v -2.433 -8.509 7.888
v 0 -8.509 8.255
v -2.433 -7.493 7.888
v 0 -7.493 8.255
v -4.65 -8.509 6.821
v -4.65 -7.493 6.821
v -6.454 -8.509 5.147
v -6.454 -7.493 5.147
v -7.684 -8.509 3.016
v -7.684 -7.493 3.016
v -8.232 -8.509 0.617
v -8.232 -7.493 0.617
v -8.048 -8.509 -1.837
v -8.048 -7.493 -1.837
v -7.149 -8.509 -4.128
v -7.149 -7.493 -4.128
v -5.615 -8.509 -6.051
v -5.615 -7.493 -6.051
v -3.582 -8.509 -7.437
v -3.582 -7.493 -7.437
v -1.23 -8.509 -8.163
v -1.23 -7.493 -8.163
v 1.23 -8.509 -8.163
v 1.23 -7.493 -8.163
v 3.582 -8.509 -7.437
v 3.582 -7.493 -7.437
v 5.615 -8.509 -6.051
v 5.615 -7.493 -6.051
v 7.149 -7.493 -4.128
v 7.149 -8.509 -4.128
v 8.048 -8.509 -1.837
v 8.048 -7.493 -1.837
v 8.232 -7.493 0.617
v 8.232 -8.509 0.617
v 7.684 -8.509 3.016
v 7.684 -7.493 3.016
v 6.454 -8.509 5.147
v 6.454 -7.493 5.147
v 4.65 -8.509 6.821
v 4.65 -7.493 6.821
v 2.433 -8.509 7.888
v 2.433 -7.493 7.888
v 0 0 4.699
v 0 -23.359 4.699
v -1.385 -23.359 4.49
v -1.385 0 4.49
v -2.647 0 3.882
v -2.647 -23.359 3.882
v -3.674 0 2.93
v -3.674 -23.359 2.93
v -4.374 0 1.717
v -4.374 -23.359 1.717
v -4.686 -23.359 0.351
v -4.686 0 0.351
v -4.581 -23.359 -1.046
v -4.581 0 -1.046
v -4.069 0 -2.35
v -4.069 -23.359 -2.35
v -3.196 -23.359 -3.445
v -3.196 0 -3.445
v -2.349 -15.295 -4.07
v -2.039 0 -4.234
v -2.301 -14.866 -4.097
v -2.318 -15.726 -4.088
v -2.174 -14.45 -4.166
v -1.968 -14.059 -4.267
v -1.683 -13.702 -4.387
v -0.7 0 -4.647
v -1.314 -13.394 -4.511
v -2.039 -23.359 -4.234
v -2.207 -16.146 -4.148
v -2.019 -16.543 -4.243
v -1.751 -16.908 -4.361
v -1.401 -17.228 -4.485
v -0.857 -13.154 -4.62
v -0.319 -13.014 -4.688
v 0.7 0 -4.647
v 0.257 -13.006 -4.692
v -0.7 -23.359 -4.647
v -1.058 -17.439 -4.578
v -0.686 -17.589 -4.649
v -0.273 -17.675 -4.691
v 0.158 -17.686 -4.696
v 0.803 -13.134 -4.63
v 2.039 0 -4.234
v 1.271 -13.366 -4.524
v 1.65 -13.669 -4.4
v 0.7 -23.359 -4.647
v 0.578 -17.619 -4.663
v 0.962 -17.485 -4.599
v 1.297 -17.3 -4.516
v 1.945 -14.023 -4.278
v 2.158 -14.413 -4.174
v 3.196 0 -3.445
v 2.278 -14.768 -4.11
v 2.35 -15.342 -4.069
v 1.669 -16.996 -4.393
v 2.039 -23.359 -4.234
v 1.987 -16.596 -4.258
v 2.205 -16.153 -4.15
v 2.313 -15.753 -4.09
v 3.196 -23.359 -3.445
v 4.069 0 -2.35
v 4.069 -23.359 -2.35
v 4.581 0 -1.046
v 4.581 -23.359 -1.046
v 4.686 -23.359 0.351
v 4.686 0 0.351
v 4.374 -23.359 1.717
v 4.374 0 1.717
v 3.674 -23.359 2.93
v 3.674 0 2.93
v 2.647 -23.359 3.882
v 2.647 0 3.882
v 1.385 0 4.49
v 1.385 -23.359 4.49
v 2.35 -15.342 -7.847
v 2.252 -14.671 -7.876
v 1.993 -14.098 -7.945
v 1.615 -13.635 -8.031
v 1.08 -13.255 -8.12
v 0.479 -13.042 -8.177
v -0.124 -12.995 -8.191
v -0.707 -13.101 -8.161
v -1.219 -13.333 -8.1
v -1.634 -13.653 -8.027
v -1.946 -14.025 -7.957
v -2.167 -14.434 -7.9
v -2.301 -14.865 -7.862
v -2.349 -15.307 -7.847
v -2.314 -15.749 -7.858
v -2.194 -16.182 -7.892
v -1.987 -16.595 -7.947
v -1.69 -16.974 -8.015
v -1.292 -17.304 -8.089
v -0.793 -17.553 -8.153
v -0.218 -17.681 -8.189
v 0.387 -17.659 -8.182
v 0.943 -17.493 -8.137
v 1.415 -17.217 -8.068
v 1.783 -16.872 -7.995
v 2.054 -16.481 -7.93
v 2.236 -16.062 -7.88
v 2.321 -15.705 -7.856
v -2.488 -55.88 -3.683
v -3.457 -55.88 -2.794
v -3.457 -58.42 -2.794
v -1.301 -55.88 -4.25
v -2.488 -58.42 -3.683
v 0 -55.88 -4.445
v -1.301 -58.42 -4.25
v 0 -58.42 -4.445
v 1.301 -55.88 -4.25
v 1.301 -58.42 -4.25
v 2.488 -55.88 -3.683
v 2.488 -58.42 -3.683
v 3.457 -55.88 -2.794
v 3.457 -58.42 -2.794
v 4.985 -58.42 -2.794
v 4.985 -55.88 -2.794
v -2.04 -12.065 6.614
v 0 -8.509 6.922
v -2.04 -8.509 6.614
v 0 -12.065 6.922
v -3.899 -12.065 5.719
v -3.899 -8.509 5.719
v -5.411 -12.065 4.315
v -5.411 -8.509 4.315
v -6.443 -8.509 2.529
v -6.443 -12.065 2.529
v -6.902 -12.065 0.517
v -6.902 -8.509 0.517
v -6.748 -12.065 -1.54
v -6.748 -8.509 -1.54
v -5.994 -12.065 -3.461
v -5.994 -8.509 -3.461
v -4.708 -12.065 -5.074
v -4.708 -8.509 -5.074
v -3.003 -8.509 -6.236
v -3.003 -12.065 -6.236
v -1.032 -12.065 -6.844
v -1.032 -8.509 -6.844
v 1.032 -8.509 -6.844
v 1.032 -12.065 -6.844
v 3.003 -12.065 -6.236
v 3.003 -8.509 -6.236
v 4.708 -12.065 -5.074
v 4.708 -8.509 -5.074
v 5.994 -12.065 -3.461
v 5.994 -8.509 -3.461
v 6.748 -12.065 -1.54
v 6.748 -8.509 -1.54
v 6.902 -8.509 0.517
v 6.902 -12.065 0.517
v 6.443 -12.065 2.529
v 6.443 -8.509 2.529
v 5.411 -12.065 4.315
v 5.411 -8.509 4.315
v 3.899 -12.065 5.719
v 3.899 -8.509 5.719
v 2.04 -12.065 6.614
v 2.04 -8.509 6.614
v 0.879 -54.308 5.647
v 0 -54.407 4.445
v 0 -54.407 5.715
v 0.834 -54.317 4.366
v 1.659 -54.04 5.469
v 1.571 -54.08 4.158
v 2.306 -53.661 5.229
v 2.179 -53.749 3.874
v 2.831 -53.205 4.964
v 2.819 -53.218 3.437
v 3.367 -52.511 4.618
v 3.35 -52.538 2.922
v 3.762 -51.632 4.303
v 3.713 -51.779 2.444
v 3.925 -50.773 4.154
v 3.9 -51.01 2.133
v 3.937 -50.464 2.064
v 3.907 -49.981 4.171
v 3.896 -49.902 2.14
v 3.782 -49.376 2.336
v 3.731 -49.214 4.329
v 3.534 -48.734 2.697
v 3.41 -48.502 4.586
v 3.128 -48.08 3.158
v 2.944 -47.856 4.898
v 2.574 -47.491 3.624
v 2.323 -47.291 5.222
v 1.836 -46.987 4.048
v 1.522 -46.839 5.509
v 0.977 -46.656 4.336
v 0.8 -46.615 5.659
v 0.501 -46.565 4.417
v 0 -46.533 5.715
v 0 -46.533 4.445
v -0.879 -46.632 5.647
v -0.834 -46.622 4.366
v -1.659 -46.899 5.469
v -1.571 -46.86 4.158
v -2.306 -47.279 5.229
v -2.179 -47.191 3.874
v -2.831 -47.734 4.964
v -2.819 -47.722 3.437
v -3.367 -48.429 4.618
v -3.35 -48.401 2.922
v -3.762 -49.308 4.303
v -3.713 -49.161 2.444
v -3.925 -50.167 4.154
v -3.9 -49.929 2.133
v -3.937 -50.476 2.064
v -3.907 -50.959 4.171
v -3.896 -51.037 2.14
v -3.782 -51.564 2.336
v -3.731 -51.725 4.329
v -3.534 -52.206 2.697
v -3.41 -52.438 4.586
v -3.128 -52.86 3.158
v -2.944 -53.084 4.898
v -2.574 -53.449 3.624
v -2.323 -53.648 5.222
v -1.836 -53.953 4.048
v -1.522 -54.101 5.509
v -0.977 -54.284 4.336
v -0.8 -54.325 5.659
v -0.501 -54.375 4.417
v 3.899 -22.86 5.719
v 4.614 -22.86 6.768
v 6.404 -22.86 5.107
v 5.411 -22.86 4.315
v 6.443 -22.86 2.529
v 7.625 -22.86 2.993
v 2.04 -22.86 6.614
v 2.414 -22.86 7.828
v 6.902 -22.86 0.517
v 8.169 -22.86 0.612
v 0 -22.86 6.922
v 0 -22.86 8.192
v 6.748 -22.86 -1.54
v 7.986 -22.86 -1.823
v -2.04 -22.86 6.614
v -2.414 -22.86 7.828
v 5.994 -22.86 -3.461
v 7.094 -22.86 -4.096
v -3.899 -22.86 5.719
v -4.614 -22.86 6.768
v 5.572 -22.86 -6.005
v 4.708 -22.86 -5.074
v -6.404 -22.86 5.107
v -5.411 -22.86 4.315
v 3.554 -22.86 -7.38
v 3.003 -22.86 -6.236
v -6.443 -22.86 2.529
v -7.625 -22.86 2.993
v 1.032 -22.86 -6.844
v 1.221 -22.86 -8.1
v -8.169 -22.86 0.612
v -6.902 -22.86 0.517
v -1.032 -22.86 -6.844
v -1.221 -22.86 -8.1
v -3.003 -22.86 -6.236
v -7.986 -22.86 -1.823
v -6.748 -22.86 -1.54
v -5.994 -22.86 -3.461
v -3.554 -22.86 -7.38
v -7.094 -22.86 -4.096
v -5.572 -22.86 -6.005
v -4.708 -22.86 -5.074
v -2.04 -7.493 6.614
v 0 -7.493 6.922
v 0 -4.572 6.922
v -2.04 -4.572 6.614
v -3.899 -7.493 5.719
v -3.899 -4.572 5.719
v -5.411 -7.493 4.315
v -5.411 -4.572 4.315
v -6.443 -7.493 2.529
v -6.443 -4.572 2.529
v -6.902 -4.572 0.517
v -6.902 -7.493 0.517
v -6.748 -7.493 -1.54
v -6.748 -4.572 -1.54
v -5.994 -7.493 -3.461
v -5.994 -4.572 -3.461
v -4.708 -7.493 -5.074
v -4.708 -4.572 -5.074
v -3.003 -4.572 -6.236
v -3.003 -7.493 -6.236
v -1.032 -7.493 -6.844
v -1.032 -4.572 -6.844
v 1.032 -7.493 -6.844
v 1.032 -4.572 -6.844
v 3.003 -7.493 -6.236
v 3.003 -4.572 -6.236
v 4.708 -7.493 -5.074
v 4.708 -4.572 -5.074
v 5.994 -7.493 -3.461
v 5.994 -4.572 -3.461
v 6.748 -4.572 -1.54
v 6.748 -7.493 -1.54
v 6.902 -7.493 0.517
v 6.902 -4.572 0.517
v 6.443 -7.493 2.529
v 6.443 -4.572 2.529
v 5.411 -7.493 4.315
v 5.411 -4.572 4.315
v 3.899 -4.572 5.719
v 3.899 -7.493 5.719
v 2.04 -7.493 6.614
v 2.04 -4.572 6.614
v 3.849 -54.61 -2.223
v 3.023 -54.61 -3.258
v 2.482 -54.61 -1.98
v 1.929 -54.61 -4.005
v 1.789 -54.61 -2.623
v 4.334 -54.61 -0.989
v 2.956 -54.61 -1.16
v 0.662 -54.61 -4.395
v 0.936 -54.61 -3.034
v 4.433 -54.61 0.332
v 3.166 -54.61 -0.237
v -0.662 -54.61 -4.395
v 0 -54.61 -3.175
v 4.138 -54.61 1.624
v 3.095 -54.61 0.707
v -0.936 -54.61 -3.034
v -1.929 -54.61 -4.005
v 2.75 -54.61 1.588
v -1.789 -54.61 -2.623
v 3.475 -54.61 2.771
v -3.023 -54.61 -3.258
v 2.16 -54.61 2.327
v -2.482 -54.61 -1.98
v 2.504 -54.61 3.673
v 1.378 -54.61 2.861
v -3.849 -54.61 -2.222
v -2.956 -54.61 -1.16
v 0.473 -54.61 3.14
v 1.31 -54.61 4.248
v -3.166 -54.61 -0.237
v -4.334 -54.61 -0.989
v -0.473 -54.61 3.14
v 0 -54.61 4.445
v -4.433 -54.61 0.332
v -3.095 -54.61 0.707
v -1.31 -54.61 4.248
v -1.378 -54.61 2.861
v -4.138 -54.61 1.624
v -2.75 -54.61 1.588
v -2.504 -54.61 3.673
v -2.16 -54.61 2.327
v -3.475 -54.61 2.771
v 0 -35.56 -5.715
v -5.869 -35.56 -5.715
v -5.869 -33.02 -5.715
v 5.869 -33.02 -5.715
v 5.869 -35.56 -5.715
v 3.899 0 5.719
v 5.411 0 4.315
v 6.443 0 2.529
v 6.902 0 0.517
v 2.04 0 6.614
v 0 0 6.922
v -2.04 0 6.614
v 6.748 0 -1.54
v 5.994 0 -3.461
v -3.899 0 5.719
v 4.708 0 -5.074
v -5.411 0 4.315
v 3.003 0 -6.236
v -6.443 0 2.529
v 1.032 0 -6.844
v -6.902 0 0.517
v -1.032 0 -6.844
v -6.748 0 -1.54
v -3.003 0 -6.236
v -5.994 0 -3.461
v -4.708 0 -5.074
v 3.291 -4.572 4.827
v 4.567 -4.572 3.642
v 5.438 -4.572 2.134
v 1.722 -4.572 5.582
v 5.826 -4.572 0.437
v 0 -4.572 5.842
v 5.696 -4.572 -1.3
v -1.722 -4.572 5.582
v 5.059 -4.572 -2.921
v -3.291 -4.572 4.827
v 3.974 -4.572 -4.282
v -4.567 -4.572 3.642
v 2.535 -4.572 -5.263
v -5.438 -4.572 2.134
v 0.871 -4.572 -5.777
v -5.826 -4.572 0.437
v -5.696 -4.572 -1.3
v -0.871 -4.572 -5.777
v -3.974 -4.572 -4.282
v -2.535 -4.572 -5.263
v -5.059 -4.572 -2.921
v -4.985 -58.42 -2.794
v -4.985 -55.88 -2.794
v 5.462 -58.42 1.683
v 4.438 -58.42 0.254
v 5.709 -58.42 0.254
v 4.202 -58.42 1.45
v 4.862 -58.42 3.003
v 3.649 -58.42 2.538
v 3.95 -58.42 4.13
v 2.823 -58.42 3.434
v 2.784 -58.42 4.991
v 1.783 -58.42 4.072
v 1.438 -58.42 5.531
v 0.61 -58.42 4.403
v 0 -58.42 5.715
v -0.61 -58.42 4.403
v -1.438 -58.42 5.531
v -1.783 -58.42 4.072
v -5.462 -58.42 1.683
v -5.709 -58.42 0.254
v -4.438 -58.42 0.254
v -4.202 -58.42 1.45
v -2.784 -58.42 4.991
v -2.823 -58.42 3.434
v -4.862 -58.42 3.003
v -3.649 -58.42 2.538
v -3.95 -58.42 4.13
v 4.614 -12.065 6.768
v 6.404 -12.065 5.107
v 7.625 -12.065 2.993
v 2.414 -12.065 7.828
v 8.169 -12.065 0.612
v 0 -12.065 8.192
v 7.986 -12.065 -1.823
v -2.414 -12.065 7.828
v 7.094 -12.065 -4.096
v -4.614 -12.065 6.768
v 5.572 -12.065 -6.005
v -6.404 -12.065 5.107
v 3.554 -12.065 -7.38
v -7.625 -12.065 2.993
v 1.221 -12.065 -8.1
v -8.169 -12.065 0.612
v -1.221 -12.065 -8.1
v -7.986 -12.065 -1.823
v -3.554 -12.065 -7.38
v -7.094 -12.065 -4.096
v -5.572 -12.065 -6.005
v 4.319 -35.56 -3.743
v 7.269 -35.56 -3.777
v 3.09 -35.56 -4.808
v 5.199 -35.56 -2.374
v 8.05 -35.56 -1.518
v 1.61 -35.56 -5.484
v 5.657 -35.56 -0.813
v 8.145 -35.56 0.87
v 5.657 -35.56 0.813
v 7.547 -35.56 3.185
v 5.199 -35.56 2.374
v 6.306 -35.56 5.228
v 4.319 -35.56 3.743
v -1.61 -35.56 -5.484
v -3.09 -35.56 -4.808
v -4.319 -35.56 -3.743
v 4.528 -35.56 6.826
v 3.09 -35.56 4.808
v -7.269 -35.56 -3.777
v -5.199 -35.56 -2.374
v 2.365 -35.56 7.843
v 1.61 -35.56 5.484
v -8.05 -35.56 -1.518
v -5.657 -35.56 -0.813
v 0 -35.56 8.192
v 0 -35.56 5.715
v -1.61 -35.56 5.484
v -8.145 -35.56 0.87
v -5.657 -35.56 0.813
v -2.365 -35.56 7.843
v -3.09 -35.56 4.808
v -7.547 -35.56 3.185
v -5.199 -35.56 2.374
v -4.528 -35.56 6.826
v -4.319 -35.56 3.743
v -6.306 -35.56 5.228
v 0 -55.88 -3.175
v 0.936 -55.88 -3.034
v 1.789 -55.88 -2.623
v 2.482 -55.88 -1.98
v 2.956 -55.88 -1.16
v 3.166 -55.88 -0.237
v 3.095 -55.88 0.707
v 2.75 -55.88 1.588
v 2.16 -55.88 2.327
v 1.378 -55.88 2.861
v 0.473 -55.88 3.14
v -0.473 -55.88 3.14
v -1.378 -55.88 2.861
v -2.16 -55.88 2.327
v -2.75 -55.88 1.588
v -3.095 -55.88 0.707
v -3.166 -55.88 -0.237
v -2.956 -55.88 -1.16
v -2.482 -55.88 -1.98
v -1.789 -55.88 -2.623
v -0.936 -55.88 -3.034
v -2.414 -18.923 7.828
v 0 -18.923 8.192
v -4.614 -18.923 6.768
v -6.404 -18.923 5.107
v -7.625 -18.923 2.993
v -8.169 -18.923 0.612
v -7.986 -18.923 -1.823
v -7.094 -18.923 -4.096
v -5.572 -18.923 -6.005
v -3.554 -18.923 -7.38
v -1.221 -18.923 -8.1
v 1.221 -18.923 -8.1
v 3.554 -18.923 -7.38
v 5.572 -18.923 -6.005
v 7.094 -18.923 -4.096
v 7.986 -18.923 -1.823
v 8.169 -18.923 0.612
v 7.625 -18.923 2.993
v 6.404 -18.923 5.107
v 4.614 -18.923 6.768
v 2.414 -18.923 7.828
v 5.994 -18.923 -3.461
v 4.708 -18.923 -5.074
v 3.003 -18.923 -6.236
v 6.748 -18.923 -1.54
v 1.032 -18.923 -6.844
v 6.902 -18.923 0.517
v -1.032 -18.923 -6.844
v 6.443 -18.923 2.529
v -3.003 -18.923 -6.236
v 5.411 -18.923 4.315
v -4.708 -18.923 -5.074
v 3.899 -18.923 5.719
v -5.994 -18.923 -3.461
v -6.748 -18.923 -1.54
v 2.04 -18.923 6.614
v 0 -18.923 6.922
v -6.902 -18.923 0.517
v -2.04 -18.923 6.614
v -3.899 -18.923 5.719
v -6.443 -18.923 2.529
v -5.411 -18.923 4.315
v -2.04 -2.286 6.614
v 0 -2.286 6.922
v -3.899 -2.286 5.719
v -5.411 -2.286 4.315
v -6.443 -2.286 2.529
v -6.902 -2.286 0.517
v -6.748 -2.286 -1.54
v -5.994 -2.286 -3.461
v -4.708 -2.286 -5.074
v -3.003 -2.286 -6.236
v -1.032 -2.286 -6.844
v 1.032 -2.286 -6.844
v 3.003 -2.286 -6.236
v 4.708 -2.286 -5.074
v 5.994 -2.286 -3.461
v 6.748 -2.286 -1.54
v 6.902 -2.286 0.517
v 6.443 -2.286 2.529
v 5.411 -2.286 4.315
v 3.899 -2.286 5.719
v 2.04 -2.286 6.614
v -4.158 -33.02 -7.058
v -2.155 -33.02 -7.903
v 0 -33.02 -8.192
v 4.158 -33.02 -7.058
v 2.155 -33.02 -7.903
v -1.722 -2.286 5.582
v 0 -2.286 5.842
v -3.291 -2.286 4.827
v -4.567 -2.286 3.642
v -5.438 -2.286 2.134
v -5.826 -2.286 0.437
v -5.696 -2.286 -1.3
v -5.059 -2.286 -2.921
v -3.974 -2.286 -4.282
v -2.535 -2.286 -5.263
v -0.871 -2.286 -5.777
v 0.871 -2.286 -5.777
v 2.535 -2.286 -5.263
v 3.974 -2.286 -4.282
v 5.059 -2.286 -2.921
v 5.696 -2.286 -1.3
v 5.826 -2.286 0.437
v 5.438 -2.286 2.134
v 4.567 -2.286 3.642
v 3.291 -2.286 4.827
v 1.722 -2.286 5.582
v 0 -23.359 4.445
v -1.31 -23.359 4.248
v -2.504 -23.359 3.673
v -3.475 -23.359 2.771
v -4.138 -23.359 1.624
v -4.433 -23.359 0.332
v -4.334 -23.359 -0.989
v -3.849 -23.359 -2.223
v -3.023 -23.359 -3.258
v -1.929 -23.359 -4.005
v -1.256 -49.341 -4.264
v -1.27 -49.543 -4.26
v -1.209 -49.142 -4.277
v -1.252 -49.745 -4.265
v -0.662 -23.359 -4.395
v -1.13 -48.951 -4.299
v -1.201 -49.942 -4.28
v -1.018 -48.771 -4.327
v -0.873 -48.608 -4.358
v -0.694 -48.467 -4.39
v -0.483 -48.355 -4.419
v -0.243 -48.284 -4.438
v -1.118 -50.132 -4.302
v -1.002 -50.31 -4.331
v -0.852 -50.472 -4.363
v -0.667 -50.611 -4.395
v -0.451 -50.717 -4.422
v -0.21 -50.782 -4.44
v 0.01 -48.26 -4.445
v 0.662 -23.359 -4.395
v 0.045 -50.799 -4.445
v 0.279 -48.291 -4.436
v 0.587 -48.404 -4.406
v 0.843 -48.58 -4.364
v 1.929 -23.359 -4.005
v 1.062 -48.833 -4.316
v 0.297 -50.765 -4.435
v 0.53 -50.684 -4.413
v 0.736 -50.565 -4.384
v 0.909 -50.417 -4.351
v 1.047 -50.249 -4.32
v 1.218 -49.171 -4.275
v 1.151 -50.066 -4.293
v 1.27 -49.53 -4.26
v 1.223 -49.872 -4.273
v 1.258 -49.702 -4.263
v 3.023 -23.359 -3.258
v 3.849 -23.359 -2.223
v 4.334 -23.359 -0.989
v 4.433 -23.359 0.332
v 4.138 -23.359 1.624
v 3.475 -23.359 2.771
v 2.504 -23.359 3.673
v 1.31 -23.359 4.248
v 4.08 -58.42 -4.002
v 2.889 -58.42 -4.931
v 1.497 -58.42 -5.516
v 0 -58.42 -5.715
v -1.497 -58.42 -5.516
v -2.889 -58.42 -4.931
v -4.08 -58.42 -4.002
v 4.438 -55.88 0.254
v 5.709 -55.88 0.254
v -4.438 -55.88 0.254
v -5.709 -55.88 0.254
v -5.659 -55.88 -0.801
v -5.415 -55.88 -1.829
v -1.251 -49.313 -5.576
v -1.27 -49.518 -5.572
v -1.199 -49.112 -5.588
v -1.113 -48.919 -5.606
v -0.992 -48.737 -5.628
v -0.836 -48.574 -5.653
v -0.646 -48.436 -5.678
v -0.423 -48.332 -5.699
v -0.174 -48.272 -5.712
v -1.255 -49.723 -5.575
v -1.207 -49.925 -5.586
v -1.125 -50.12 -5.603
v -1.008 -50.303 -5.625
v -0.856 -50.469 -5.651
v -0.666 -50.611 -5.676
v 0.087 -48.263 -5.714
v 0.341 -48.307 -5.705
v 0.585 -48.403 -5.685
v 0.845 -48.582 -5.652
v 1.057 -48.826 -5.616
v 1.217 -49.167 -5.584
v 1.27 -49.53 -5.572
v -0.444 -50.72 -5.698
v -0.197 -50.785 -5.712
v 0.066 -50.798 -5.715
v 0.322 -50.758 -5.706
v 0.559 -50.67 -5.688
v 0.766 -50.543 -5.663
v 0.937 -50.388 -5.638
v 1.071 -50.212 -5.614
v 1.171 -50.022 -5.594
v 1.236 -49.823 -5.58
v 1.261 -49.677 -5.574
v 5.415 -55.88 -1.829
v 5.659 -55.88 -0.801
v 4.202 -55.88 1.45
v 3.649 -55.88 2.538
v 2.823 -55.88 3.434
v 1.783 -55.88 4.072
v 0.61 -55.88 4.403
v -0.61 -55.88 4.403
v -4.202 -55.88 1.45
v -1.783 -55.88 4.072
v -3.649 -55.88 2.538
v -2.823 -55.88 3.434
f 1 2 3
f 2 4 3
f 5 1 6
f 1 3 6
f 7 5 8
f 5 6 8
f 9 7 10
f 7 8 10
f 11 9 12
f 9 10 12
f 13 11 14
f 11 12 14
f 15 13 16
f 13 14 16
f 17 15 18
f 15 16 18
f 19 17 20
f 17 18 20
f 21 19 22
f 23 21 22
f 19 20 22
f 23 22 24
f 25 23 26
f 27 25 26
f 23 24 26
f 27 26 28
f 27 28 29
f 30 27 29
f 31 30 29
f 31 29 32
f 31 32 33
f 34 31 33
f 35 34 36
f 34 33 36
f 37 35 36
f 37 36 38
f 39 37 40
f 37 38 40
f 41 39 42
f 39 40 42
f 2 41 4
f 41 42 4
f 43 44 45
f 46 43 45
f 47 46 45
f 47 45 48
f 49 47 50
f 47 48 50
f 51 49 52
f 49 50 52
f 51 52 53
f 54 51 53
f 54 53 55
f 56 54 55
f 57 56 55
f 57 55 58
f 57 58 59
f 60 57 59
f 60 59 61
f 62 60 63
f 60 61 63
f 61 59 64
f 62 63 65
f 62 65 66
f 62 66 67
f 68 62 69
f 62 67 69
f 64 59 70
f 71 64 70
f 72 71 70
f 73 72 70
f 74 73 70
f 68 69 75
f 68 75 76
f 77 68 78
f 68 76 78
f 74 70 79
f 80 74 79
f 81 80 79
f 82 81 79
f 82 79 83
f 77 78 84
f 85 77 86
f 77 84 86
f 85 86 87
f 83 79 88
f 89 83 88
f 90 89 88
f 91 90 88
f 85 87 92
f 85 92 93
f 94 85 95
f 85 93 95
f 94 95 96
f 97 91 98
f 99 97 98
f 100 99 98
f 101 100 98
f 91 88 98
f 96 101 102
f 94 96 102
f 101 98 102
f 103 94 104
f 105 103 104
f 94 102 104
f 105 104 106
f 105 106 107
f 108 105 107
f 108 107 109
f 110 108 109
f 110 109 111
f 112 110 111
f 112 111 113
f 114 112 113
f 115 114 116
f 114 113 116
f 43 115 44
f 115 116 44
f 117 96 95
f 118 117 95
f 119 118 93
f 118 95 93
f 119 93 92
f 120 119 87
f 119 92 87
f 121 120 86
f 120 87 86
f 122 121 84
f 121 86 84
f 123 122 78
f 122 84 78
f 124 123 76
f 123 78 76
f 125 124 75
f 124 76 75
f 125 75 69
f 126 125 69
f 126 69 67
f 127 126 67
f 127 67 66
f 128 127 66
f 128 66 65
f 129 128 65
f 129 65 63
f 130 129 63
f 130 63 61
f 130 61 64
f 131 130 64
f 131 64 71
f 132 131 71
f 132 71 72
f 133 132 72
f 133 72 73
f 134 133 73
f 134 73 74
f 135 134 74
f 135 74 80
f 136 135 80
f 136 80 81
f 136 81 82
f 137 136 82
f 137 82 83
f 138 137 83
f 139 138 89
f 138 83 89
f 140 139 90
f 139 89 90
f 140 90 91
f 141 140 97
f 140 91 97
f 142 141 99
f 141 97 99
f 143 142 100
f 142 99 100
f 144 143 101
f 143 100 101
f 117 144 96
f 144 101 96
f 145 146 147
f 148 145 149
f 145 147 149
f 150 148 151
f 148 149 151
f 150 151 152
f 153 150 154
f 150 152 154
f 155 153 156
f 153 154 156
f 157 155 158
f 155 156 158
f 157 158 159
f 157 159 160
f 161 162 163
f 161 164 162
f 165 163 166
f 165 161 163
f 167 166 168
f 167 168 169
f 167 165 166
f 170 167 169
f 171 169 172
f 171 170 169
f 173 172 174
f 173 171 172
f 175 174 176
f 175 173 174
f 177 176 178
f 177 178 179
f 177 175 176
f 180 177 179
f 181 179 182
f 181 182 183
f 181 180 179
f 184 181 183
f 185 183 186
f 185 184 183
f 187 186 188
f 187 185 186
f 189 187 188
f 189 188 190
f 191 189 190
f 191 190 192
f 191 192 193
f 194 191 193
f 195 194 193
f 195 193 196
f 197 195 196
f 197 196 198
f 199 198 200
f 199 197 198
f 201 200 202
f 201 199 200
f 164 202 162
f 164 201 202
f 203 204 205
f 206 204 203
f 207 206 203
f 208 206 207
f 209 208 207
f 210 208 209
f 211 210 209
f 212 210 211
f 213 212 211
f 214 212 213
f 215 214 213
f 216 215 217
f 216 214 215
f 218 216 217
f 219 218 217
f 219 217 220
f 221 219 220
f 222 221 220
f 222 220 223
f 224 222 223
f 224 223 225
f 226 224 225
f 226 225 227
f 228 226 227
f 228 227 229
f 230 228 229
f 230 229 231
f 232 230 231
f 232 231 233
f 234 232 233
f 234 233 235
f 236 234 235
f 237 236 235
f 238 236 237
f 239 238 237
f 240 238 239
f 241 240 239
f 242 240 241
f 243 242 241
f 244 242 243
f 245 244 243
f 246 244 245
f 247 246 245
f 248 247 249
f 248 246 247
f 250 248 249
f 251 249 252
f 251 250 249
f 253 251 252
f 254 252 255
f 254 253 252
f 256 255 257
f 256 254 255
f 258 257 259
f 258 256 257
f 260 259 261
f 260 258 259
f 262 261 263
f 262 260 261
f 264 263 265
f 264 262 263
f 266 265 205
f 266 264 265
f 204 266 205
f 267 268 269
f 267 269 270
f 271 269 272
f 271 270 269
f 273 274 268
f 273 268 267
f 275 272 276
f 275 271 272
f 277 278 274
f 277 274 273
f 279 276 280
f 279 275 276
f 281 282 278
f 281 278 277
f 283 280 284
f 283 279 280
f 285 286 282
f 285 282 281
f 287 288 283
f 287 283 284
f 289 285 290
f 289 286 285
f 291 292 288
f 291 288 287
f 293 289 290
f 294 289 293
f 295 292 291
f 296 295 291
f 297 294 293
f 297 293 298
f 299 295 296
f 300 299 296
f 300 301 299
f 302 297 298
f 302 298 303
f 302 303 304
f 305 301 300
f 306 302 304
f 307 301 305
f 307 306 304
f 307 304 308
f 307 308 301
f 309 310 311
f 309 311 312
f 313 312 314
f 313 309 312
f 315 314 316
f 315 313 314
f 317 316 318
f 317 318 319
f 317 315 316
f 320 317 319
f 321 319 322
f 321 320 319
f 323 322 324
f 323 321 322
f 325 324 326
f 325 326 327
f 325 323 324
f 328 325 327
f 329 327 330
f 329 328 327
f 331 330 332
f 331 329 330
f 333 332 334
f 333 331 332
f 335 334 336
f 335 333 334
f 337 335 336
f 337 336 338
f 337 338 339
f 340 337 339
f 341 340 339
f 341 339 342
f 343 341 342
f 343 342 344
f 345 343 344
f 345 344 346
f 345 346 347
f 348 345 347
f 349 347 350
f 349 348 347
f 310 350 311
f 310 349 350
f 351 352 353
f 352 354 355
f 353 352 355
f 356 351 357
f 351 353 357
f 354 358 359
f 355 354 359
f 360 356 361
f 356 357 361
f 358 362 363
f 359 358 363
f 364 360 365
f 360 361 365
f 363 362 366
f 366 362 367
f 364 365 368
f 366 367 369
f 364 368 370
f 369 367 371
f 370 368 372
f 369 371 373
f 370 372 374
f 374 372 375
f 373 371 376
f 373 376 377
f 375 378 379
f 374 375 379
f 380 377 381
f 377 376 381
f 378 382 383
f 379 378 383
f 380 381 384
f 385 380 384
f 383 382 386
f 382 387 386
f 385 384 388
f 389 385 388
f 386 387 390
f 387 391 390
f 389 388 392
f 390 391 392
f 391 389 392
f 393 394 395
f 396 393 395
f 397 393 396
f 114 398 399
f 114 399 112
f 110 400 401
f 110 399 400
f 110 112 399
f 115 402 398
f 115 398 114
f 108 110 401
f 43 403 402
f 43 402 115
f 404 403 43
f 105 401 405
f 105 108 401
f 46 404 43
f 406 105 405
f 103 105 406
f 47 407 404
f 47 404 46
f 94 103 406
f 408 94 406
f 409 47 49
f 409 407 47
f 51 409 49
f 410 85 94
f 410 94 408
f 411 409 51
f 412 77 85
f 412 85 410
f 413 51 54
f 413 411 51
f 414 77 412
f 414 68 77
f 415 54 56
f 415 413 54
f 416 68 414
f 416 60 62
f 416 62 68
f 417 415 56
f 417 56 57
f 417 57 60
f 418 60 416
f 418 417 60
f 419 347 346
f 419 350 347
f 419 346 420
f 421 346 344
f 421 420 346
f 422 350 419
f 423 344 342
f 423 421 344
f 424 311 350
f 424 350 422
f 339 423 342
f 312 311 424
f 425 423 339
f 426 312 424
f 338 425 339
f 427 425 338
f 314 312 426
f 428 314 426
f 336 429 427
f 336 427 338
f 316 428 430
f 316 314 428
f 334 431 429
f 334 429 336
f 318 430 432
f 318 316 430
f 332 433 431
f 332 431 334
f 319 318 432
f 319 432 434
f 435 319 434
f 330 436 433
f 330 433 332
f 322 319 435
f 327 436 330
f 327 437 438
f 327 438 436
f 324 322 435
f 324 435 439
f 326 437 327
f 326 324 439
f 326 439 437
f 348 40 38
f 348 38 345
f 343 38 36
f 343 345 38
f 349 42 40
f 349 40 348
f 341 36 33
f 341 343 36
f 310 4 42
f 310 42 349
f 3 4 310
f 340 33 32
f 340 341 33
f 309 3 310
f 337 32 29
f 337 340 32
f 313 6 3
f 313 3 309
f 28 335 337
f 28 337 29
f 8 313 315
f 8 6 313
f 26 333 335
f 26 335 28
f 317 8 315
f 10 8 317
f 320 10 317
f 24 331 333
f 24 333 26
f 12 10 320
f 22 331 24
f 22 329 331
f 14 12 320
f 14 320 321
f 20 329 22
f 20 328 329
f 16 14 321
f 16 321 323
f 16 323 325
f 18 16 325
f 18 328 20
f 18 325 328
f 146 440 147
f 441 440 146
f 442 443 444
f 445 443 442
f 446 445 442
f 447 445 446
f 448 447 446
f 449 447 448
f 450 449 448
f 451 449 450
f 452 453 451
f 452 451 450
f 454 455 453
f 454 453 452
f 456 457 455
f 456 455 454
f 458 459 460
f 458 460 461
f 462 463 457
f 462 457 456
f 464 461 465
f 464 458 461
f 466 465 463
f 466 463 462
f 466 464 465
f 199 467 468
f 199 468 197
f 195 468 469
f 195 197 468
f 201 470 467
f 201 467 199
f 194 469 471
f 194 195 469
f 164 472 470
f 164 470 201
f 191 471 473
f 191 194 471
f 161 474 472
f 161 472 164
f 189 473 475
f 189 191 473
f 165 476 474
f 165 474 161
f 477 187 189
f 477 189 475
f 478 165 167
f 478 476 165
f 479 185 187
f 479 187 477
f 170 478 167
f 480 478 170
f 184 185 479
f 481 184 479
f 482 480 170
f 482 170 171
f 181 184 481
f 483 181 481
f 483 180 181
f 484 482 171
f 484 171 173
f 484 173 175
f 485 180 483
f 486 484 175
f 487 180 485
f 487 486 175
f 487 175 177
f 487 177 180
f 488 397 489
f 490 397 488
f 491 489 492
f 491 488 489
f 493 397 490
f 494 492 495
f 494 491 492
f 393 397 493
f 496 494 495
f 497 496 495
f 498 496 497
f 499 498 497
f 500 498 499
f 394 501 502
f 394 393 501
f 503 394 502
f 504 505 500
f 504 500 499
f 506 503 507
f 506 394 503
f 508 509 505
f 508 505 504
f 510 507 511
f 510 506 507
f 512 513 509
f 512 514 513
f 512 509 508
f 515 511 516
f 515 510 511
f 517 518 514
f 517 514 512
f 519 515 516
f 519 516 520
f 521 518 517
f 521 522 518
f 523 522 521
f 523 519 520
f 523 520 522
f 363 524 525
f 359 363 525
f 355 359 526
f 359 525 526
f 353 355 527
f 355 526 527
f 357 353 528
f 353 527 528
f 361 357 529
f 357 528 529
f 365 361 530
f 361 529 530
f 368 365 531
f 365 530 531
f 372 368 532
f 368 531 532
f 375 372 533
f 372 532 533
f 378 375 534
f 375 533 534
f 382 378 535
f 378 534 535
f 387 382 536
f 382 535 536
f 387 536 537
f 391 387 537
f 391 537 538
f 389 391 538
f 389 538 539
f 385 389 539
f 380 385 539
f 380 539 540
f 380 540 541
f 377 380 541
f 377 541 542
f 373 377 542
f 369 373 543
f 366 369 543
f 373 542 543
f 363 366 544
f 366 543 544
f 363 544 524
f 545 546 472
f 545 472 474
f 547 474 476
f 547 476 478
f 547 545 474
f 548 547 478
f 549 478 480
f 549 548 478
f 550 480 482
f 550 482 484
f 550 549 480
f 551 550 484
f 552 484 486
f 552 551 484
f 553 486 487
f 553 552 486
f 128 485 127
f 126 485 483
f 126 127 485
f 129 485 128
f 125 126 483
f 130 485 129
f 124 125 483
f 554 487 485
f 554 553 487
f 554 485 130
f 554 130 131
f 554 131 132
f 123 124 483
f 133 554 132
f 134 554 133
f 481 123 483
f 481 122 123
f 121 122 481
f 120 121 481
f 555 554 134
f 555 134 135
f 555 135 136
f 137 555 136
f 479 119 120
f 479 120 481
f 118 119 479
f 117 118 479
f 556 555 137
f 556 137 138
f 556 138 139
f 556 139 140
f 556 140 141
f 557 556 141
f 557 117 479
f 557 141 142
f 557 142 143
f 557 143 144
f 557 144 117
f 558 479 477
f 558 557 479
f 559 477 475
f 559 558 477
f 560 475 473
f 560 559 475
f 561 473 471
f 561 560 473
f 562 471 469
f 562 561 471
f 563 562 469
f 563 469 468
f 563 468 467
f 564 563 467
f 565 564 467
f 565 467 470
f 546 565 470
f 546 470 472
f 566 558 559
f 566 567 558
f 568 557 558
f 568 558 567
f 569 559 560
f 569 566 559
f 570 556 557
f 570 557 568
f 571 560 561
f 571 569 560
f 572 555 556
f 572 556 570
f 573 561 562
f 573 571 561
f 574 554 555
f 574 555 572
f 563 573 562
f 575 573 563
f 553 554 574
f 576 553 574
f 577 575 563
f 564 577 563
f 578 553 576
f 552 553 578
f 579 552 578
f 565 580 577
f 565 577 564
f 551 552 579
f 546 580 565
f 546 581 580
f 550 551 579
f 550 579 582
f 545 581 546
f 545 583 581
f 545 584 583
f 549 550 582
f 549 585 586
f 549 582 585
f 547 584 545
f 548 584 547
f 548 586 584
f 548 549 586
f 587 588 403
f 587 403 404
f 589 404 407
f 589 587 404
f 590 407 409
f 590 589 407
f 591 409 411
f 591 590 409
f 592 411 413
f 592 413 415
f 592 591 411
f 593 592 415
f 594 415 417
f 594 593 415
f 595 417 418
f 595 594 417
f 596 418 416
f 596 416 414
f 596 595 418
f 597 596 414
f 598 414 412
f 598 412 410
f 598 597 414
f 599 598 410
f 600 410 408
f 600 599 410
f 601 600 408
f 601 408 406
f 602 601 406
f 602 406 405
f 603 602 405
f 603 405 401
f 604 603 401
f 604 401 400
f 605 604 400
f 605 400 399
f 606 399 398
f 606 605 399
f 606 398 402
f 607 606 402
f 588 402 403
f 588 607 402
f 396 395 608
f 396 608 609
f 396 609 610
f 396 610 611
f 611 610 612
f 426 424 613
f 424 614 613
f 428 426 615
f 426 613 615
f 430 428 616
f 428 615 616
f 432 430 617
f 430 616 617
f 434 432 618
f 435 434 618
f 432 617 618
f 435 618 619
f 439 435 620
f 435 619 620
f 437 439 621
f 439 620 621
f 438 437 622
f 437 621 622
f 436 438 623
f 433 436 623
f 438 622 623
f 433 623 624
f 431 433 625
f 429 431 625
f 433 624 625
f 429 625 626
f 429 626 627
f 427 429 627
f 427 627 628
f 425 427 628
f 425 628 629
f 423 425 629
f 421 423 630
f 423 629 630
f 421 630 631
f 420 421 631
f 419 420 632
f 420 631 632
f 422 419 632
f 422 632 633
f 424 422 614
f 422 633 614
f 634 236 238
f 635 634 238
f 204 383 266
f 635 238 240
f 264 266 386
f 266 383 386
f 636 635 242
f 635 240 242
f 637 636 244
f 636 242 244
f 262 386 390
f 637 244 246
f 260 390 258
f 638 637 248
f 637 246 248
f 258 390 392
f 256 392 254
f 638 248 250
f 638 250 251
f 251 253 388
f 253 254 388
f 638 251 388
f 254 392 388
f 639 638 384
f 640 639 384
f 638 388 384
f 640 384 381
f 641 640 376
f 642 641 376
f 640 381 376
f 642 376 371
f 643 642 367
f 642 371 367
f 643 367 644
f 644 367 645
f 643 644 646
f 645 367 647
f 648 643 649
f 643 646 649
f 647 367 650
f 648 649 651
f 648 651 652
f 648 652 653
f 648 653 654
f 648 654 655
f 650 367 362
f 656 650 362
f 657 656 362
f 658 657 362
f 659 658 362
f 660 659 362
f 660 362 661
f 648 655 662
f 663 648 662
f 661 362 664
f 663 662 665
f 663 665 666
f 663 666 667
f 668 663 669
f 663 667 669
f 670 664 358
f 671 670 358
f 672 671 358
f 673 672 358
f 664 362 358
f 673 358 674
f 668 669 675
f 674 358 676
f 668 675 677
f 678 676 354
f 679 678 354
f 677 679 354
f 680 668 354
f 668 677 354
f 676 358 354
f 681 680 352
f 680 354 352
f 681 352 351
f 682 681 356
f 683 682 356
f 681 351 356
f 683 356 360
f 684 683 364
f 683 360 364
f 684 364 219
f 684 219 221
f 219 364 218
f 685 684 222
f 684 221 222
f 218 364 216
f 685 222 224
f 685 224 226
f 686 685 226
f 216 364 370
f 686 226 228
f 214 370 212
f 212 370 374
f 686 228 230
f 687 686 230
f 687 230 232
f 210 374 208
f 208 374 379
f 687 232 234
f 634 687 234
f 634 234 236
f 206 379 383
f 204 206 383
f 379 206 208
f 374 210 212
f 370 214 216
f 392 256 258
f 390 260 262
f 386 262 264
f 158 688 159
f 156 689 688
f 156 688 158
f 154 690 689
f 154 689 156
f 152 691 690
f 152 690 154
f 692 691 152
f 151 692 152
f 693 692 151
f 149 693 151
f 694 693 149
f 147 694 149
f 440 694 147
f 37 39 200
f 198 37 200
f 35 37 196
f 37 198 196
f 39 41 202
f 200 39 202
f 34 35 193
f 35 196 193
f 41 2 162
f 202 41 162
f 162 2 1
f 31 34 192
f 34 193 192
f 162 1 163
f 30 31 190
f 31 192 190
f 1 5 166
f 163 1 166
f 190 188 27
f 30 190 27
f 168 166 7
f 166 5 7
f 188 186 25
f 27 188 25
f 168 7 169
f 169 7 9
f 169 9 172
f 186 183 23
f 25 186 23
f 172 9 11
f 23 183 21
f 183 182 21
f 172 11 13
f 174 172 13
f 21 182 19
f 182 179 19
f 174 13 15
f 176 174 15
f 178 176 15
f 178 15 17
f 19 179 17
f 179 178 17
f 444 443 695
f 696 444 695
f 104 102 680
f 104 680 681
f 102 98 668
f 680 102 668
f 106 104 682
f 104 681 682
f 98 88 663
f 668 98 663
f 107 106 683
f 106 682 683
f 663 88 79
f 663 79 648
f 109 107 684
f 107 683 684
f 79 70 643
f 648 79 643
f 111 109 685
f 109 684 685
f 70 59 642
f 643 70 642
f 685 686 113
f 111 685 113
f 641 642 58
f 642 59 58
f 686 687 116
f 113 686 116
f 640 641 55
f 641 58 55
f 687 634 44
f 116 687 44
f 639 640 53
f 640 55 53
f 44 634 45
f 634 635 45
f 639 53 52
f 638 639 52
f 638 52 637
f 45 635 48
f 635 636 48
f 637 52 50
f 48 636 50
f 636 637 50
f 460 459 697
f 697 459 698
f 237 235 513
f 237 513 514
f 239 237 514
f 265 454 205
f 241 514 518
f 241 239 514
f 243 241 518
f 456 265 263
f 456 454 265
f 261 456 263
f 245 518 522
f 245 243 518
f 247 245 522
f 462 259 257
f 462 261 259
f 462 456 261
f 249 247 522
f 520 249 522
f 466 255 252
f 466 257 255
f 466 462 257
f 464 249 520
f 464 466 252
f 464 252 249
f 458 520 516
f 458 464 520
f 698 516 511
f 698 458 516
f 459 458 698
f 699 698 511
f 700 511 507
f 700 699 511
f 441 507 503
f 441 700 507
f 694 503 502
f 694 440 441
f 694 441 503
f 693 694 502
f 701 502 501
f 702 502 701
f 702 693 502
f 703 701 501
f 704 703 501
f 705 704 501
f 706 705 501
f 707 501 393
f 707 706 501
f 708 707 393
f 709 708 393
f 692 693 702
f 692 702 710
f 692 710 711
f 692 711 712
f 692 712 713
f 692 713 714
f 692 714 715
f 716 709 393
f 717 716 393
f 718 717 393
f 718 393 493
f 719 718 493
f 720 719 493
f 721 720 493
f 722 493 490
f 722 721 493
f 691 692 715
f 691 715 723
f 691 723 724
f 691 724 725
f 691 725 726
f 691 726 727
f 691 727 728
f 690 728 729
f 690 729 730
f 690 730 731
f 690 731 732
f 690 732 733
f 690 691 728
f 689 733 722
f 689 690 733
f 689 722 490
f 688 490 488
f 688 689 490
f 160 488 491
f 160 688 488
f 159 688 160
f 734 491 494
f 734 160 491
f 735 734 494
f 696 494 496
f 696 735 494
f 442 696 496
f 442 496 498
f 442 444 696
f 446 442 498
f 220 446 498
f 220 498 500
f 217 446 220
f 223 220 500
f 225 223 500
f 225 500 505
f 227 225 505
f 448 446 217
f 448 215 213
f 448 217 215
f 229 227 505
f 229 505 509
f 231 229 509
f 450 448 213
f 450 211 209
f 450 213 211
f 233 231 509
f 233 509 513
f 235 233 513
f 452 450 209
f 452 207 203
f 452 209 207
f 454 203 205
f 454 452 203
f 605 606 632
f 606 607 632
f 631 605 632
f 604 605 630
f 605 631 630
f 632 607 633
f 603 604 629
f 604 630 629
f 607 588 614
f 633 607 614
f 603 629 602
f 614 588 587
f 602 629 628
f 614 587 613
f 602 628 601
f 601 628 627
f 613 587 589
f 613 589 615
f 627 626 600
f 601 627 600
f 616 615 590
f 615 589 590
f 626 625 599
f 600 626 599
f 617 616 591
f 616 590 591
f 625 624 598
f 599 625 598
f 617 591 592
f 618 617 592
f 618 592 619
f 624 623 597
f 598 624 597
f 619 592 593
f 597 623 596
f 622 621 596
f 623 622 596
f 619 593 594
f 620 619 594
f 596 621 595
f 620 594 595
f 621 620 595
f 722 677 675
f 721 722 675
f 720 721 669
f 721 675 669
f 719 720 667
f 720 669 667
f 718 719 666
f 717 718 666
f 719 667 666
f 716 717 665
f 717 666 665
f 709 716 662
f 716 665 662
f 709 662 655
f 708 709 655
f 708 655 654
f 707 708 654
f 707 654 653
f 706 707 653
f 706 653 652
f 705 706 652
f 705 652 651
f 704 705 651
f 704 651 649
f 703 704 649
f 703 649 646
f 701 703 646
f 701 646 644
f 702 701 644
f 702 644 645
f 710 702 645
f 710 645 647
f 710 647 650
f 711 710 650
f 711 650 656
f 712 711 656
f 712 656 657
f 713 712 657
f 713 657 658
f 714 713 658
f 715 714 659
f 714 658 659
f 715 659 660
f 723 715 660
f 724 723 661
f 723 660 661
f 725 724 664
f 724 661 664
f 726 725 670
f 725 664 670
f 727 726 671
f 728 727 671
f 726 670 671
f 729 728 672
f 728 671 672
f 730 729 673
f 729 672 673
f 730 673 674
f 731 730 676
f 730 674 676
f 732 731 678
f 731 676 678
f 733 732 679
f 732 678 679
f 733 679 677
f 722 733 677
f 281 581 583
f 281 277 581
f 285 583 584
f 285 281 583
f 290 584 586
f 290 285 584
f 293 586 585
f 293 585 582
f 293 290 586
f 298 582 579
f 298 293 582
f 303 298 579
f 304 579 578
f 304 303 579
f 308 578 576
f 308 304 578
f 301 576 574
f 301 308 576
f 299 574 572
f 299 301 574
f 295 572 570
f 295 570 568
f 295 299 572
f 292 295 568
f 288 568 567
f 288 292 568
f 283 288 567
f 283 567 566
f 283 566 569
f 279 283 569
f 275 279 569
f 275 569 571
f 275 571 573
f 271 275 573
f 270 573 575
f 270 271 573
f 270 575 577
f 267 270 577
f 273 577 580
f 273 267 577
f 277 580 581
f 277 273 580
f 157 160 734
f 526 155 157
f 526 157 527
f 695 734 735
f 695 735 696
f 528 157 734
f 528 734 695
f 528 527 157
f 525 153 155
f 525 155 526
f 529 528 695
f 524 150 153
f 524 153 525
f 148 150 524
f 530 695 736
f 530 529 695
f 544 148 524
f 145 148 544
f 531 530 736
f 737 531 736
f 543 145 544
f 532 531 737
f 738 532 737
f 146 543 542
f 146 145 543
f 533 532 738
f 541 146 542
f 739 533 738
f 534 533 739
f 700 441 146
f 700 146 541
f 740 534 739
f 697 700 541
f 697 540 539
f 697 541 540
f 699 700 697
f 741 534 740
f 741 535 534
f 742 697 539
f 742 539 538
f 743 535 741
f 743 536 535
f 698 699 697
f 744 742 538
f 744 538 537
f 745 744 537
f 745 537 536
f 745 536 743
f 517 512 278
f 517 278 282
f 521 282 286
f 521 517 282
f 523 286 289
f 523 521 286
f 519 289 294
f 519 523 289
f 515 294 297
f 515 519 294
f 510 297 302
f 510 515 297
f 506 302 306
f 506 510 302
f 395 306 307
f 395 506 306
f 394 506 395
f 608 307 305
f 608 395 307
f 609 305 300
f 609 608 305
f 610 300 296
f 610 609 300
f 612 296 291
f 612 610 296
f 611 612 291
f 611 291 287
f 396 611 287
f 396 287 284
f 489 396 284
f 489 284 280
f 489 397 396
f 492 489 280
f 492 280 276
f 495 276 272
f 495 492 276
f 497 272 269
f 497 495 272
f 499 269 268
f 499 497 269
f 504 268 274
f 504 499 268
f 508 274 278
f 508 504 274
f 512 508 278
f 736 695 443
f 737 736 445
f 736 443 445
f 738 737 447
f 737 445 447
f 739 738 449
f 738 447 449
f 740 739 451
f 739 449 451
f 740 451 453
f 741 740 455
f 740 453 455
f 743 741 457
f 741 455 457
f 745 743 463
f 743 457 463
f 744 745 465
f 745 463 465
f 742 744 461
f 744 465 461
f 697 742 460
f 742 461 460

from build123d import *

# Parameters (mm, degrees)
SKETCH3_W                        = 1.0795
SKETCH3_H                        = 2.286
SKETCH4_W                        = 1.3335
SKETCH4_H                        = 1.016
SKETCH6_R                        = 3.937
AIR_OUT_2_MOUTHPIECE_DEPTH       = 60.575048888
SKETCH7_R                        = 2.3495
AIR_OUT_2_BC_DEPTH               = 60.575048986
SKETCH8_R                        = 1.27
VENT_DEPTH                       = 60.575048986
SLOT_FOR_DEMAND_LEVER_DEPTH      = 60.575048986
SLOT_FOR_DEMAND_LEVER_DEPTH_BACK = 60.575048986
SKETCH9_W                        = 3.048
SKETCH9_H                        = 2.54
SKETCH10_W                       = 16.383
SKETCH10_H                       = 2.4765
CLOCKING_CUT_DEPTH               = 2.54
SKETCH11_R                       = 4.445
SKETCH11_R_2                     = 3.175
SPRING_REST_DEPTH                = 1.27


with BuildPart() as part:
    # Sketch2 → Main Shaft (revolve)
    with BuildSketch(Plane.XY, mode=Mode.PRIVATE) as main_shaft_sk:
        Polygon((0, 0), (6.9215, 0), (6.9215, -12.065), (8.1915, -12.065), (8.1915, -18.923), (6.9215, -18.923), (6.9215, -22.86), (8.1915, -22.86), (8.1915, -35.56), (5.715, -35.56), (5.715, -58.42), (0, -58.42), align=None)
    revolve(main_shaft_sk.sketch.rotate(Axis((0, 0, 0), (0, -1, 0)), 90), axis=Axis((0, 0, 0), (0, -1, 0)))

    # Sketch3 → Top Groove (revolve, cut)
    with BuildSketch(Plane.XY, mode=Mode.PRIVATE) as top_groove_sk:
        with Locations((6.38175, -3.429)):
            Rectangle(SKETCH3_W, SKETCH3_H)
    revolve(top_groove_sk.sketch.rotate(Axis((0, 0, 0), (0, -1, 0)), 90), axis=Axis((0, 0, 0), (0, -1, 0)), mode=Mode.SUBTRACT)

    # Sketch4 → Upper Flange (revolve)
    with BuildSketch(Plane.XY, mode=Mode.PRIVATE) as upper_flange_sk:
        with Locations((7.58825, -8.001)):
            Rectangle(SKETCH4_W, SKETCH4_H)
    revolve(upper_flange_sk.sketch.rotate(Axis((0, 0, 0), (0, -1, 0)), 90), axis=Axis((0, 0, 0), (0, -1, 0)))

    # Sketch5 → ID 2 (revolve, cut)
    with BuildSketch(Plane.XY, mode=Mode.PRIVATE) as id_2_sk:
        Polygon((0, 0), (4.699, 0), (4.699, -23.359316239), (4.445, -23.359316239), (4.445, -58.42), (0, -58.42), align=None)
    revolve(id_2_sk.sketch.rotate(Axis((0, 0, 0), (0, -1, 0)), 90), axis=Axis((0, 0, 0), (0, -1, 0)), mode=Mode.SUBTRACT)

    # Sketch6 → Air Out 2 Mouthpiece (cut, through all)
    with BuildSketch(Plane.XY):
        with Locations(Location((0, -50.4698, 0), (0, 0, 270))):
            Circle(SKETCH6_R)
    extrude(amount=AIR_OUT_2_MOUTHPIECE_DEPTH, mode=Mode.SUBTRACT)

    # Sketch7 → Air Out 2 BC (cut, through all)
    with BuildSketch(Plane.XY):
        with Locations((0, -15.3416)):
            Circle(SKETCH7_R)
    extrude(amount=-AIR_OUT_2_BC_DEPTH, mode=Mode.SUBTRACT)

    # Sketch8 → Vent (cut, through all)
    with BuildSketch(Plane.XY):
        with Locations((0, -49.53)):
            Circle(SKETCH8_R)
    extrude(amount=-VENT_DEPTH, mode=Mode.SUBTRACT)

    # Sketch9 → Slot for Demand Lever (cut, two sides: drawn at the far end of the back side and taken through both)
    with BuildSketch(Plane(origin=(0, 0, 0), x_dir=(0, 0, -1), z_dir=(1, 0, 0)).offset(-SLOT_FOR_DEMAND_LEVER_DEPTH_BACK)):
        with Locations((1.27, -57.15)):
            Rectangle(SKETCH9_W, SKETCH9_H)
    extrude(amount=SLOT_FOR_DEMAND_LEVER_DEPTH + SLOT_FOR_DEMAND_LEVER_DEPTH_BACK, mode=Mode.SUBTRACT)

    # Sketch10 → Clocking cut (cut)
    with BuildSketch(Plane.XZ.offset(35.56)):
        with Locations((0, -6.95325)):
            Rectangle(SKETCH10_W, SKETCH10_H)
    extrude(amount=-CLOCKING_CUT_DEPTH, mode=Mode.SUBTRACT)

    # Sketch11 → Spring Rest (add)
    with BuildSketch(Plane.XZ.offset(55.88)):
        with Locations(Location((0, 0, 0), (0, 0, 90))):
            Circle(SKETCH11_R)
        with Locations(Location((0, 0, 0), (0, 0, 270))):
            Circle(SKETCH11_R_2, mode=Mode.SUBTRACT)
    extrude(amount=-SPRING_REST_DEPTH)


solid = part.part
